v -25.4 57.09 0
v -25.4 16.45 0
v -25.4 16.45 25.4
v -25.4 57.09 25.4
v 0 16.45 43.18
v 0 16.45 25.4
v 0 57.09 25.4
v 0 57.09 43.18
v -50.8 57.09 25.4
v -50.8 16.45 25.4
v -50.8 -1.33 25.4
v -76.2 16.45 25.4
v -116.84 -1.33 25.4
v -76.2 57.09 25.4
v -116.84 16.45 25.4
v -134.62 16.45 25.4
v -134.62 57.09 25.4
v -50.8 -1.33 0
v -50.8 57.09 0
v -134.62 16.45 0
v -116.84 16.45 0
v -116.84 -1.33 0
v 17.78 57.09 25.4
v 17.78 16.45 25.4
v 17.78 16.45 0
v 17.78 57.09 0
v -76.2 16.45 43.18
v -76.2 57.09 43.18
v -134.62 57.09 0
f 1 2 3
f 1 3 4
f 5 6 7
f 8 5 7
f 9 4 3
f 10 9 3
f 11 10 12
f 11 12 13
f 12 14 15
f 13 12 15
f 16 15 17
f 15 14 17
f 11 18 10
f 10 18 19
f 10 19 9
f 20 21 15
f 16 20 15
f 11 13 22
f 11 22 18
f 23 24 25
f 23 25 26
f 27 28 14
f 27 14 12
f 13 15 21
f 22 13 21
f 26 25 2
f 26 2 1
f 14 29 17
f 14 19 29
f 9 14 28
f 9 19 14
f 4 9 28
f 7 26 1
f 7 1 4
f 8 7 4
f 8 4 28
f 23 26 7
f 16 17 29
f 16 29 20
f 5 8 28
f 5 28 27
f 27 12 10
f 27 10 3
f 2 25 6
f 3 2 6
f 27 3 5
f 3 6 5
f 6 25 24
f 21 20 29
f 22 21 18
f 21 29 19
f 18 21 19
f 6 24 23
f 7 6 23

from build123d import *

# Parameters (mm, degrees)
F0_W      = 40.64
F0_H      = 25.4
F1_DEPTH  = 17.78
F2_DEPTH  = 25.4
F3_W      = 25.4
F3_H      = 40.64
F4_DEPTH  = 17.78
F5_W      = 40.64
F5_H      = 17.78
F6_DEPTH  = 50.8
F7_W      = 25.4
F7_H      = 40.64
F8_DEPTH  = 25.4
F9_W      = 40.64
F9_H      = 25.4
F10_DEPTH = 58.42
F12_DEPTH = 17.78


with BuildPart() as f1:
    # F0 (on Right) → F1 (new body)
    with BuildSketch(Plane.YZ):
        with Locations((36.7695213166, 12.7)):
            Rectangle(F0_W, F0_H)
    extrude(amount=F1_DEPTH)

    # F2 (add): a face of the model
    f2_faces = [f1.faces().sort_by_distance(p)[0] for p in [
        (0, 36.7695213166, 12.7),
    ]]
    extrude(f2_faces, amount=F2_DEPTH)

    # F3 (on face) → F4 (join)
    with BuildSketch(Plane.XY.offset(25.4)):
        with Locations((-12.7, 36.7695213166)):
            Rectangle(F3_W, F3_H)
    extrude(amount=F4_DEPTH)

    # F5 (on face) → F6 (join)
    with BuildSketch(Plane(origin=(-25.4, 0, 0), x_dir=(0, -1, 0), z_dir=(-1, 0, 0))):
        with Locations((-36.7695213166, 34.29)):
            Rectangle(F5_W, F5_H)
    extrude(amount=F6_DEPTH)

    # F7 (on face) → F8 (join)
    with BuildSketch(Plane(origin=(0, 0, 25.4), x_dir=(1, 0, 0), z_dir=(0, 0, -1))):
        with Locations((-63.5, -36.7695213166)):
            Rectangle(F7_W, F7_H)
    extrude(amount=F8_DEPTH)

    # F9 (on face) → F10 (join)
    with BuildSketch(Plane(origin=(-76.2, 0, 0), x_dir=(0, -1, 0), z_dir=(-1, 0, 0))):
        with Locations((-36.7695213166, 12.7)):
            Rectangle(F9_W, F9_H)
    extrude(amount=F10_DEPTH)

    # F11 (on face) → F12 (join)
    with BuildSketch(Plane.XZ.offset(-16.4495213166)):
        Polygon((-76.2, 25.4), (-116.84, 25.4), (-116.84, 0), (-50.8, 0), (-50.8, 25.4), align=None)
    extrude(amount=F12_DEPTH)


solid = f1.part
